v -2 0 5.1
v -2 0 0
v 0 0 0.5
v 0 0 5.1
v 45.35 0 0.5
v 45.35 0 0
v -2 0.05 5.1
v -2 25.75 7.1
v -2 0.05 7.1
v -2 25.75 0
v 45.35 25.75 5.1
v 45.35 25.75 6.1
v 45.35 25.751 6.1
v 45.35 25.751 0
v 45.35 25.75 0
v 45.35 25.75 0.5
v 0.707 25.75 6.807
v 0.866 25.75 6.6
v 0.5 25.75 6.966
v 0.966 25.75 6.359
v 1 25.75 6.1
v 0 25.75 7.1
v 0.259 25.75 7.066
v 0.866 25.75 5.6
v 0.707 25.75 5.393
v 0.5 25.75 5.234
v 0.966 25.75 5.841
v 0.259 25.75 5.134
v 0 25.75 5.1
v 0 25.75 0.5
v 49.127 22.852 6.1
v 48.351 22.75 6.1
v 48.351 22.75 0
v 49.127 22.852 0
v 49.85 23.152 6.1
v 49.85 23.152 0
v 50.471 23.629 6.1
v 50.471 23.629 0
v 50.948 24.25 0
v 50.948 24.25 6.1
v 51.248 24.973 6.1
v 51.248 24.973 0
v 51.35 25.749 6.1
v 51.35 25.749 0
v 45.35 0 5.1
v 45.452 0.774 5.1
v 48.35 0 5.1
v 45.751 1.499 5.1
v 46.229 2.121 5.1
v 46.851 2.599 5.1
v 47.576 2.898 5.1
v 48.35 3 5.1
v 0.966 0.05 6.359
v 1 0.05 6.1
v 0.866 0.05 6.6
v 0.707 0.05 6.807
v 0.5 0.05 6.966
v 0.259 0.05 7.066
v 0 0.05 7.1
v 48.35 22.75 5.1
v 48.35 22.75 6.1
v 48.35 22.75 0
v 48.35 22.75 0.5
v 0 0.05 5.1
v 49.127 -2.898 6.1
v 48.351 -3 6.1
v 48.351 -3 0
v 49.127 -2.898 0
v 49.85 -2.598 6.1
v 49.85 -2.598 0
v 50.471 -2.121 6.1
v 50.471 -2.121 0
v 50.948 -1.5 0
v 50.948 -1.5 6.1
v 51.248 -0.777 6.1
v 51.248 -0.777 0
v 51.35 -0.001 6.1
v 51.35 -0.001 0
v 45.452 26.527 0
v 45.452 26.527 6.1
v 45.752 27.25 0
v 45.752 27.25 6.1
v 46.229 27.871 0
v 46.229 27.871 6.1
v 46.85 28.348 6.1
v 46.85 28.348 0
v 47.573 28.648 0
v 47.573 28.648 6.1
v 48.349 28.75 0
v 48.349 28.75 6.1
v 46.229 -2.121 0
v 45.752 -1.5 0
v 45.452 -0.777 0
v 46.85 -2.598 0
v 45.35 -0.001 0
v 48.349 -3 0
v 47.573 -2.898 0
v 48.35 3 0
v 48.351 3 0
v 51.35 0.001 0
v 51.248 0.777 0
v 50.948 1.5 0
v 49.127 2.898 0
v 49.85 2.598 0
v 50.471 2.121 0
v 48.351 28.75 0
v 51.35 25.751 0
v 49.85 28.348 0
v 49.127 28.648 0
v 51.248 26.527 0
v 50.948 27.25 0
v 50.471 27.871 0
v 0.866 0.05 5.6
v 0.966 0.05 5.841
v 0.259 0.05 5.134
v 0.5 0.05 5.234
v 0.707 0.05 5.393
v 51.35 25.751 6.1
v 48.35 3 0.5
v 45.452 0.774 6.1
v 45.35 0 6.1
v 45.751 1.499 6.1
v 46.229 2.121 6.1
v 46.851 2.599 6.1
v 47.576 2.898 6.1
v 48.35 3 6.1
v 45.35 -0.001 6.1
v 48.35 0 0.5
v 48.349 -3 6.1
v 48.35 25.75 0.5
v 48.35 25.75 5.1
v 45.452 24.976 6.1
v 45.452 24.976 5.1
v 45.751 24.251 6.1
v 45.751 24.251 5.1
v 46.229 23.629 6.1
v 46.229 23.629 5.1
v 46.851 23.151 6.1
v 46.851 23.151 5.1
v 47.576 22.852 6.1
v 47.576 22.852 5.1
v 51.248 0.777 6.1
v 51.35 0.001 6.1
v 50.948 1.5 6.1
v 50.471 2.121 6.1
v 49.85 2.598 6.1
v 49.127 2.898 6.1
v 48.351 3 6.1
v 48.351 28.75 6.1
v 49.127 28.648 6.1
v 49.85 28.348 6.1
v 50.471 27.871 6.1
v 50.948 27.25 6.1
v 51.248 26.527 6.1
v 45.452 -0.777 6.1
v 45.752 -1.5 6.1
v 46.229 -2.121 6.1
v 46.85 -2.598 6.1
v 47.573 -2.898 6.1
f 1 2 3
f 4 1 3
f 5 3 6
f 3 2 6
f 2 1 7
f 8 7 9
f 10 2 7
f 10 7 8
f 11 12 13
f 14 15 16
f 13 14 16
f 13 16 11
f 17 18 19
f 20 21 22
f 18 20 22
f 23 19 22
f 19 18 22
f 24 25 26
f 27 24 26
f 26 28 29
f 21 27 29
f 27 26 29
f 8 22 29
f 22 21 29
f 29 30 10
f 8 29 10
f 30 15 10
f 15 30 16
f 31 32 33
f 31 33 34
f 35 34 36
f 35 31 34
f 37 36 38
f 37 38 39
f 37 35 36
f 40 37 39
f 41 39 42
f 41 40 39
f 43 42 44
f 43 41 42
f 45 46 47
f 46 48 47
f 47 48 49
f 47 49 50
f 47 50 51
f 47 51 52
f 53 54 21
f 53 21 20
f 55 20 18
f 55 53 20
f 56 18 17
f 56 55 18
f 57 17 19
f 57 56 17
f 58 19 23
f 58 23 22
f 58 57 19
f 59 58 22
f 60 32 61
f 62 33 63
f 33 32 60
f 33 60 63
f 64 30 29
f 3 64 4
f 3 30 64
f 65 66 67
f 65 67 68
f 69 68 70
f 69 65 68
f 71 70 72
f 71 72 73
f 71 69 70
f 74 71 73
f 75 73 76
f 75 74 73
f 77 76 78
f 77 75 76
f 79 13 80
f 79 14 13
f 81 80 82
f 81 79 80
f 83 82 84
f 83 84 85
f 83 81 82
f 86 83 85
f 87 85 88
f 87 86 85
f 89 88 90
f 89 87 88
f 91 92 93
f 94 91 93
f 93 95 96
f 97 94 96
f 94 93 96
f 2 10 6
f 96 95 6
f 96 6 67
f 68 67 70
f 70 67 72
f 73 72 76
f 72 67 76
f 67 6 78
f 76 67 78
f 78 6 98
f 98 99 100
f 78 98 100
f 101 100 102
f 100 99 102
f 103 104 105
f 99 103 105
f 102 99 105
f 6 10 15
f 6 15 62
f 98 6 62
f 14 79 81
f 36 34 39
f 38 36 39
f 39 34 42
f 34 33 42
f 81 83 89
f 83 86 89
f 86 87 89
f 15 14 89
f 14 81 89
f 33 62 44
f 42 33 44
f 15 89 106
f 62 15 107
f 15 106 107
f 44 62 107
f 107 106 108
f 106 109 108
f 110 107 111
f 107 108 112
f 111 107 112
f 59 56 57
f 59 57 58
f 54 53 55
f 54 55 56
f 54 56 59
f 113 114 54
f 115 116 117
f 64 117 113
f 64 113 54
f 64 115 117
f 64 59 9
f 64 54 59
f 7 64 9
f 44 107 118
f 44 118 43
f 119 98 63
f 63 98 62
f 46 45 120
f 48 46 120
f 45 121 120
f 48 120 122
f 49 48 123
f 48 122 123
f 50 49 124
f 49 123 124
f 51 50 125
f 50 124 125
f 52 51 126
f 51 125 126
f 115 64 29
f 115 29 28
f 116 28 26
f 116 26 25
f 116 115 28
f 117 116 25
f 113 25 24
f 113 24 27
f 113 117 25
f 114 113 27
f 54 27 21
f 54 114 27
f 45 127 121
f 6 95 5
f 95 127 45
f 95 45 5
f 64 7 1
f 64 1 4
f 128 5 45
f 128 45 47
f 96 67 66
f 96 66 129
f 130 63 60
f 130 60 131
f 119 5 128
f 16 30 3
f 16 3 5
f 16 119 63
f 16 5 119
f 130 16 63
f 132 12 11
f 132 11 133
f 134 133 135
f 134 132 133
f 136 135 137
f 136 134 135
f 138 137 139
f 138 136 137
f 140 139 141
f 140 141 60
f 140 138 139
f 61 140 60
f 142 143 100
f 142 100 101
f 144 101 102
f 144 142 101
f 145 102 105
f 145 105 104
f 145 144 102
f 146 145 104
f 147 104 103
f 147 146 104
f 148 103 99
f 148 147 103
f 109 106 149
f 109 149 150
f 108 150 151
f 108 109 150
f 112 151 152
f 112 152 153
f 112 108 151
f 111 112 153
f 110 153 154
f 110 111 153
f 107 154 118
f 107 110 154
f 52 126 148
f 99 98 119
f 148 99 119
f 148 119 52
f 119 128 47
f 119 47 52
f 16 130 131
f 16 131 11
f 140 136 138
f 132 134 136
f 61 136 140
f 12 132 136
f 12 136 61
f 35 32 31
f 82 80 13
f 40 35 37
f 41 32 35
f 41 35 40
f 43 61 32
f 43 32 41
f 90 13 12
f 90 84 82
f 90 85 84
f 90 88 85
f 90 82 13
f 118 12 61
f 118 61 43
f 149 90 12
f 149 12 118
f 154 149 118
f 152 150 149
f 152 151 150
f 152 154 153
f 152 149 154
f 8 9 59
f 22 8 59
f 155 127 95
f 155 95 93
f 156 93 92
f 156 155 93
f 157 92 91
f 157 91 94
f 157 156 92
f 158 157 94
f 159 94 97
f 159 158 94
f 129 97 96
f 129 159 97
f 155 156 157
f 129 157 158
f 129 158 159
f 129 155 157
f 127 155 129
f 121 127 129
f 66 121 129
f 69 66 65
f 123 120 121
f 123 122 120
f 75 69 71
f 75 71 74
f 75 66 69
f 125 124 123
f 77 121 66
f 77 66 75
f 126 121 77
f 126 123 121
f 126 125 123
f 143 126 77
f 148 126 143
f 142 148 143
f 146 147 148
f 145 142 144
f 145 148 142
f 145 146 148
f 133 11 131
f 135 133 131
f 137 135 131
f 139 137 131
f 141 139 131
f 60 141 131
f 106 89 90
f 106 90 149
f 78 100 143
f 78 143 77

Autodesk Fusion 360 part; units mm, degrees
sketch "Sketch1" plane through (0, 0, 0) normal (0, 0, 1) x (1, 0, 0)
  line L0 (0, 0) -> (48.35, 0)
  line L1 (48.35, 0) -> (48.35, 25.75)
  line L2 (48.35, 25.75) -> (0, 25.75)
  line L3 (0, 25.75) -> (0, 0)
  line L4 (51.35, 22.75) -> (45.35, 22.75)
  line L5 (45.35, 22.75) -> (45.35, 28.75)
  line L6 (45.35, 28.75) -> (51.35, 28.75)
  line L7 (51.35, 28.75) -> (51.35, 22.75)
  line L8 (51.35, 22.75) -> (45.35, 28.75) construction
  line L9 (45.35, 22.75) -> (51.35, 28.75) construction
  line L10 (51.35, -3) -> (45.35, -3)
  line L11 (45.35, -3) -> (45.35, 3)
  line L12 (45.35, 3) -> (51.35, 3)
  line L13 (51.35, 3) -> (51.35, -3)
  line L14 (51.35, -3) -> (45.35, 3) construction
  line L15 (45.35, -3) -> (51.35, 3) construction
  line L16 (0, 0) -> (-2, 0)
  line L17 (-2, 0) -> (-2, 25.75)
  line L18 (-2, 25.75) -> (0, 25.75)
  line L19 (0, 25.75) -> (0, 0)
  point P0 (48.35, 25.75)
  point P1 (48.35, 0)
  dimension "d1" = 48.35
  dimension "d2" = 25.75
  dimension "d3" = 6
  dimension "d4" = 6
  dimension "d5" = 6
  dimension "d6" = 6
  dimension "d7" = 2
  dimension "d8" = 25.75
extrude "Extrude1" add sketch "Sketch1" along normal blind 0.5
extrude "Extrude2" add sketch "Sketch1" along normal blind 5.1 contours L3 L16 L17 L18 L19
sketch "Sketch2" plane through (0, 0, 5.1) normal (0, 0, 1) x (1, 0, 0)
  line L0 (0, 25.75) -> (-2, 25.75)
  line L1 (-2, 25.75) -> (-2, 0)
  line L2 (-2, 0) -> (0, 0)
  line L3 (0, 0) -> (0, 25.75)
  line L4 (-2, 25.75) -> (1, 25.75)
  line L5 (1, 25.75) -> (1, 0.05)
  line L6 (1, 0.05) -> (-2, 0.05)
  line L7 (-2, 0.05) -> (-2, 25.75)
  dimension "d13" = 3
  dimension "d14" = 25.7
extrude "Extrude3" add sketch "Sketch2" along normal blind 2 contours L0 L1 L3 L4 L6 L7 | L3 L4 L5 L6
fillet "Fillet1" radius 1 2 edges at (1, 12.9, 7.1) (1, 12.9, 5.1)
extrude "Extrude4" add sketch "Sketch1" along normal blind 5.1 contours L0 L1 L10 L11 L12 L13 | L1 L2 L4 L5 L6 L7
sketch "Sketch3" plane through (0, 0, 5.1) normal (0, 0, 1) x (1, 0, 0)
  line L0 (51.35, 3) -> (48.35, 3)
  line L1 (48.35, 3) -> (48.35, 0)
  line L2 (48.35, 0) -> (45.35, 0)
  line L3 (45.35, 0) -> (45.35, -3)
  line L4 (45.35, -3) -> (51.35, -3)
  line L5 (51.35, -3) -> (51.35, 3)
  line L6 (51.35, -3) -> (45.35, -3)
  line L7 (45.35, -3) -> (45.35, 3)
  line L8 (45.35, 3) -> (51.35, 3)
  line L9 (51.35, 3) -> (51.35, -3)
  line L10 (51.35, 28.75) -> (45.35, 28.75)
  line L11 (45.35, 28.75) -> (45.35, 22.75)
  line L12 (45.35, 22.75) -> (51.35, 22.75)
  line L13 (51.35, 22.75) -> (51.35, 28.75)
  point P0 (51.35, 28.75)
  dimension "d21" = 6
  dimension "d22" = 6
  dimension "d23" = 6
  dimension "d24" = 6
extrude "Extrude5" add sketch "Sketch3" along normal blind 1
fillet "Fillet2" radius 3 6 edges at (51.35, -3, 3.05) (51.35, 3, 3.05) (45.35, -3, 3.05) (51.35, 22.75, 3.05) (45.35, 28.75, 3.05) (51.35, 28.75, 3.05)
fillet "Fillet3" radius 3 2 edges at (45.35, 22.75, 5.6) (45.35, 3, 5.6)
